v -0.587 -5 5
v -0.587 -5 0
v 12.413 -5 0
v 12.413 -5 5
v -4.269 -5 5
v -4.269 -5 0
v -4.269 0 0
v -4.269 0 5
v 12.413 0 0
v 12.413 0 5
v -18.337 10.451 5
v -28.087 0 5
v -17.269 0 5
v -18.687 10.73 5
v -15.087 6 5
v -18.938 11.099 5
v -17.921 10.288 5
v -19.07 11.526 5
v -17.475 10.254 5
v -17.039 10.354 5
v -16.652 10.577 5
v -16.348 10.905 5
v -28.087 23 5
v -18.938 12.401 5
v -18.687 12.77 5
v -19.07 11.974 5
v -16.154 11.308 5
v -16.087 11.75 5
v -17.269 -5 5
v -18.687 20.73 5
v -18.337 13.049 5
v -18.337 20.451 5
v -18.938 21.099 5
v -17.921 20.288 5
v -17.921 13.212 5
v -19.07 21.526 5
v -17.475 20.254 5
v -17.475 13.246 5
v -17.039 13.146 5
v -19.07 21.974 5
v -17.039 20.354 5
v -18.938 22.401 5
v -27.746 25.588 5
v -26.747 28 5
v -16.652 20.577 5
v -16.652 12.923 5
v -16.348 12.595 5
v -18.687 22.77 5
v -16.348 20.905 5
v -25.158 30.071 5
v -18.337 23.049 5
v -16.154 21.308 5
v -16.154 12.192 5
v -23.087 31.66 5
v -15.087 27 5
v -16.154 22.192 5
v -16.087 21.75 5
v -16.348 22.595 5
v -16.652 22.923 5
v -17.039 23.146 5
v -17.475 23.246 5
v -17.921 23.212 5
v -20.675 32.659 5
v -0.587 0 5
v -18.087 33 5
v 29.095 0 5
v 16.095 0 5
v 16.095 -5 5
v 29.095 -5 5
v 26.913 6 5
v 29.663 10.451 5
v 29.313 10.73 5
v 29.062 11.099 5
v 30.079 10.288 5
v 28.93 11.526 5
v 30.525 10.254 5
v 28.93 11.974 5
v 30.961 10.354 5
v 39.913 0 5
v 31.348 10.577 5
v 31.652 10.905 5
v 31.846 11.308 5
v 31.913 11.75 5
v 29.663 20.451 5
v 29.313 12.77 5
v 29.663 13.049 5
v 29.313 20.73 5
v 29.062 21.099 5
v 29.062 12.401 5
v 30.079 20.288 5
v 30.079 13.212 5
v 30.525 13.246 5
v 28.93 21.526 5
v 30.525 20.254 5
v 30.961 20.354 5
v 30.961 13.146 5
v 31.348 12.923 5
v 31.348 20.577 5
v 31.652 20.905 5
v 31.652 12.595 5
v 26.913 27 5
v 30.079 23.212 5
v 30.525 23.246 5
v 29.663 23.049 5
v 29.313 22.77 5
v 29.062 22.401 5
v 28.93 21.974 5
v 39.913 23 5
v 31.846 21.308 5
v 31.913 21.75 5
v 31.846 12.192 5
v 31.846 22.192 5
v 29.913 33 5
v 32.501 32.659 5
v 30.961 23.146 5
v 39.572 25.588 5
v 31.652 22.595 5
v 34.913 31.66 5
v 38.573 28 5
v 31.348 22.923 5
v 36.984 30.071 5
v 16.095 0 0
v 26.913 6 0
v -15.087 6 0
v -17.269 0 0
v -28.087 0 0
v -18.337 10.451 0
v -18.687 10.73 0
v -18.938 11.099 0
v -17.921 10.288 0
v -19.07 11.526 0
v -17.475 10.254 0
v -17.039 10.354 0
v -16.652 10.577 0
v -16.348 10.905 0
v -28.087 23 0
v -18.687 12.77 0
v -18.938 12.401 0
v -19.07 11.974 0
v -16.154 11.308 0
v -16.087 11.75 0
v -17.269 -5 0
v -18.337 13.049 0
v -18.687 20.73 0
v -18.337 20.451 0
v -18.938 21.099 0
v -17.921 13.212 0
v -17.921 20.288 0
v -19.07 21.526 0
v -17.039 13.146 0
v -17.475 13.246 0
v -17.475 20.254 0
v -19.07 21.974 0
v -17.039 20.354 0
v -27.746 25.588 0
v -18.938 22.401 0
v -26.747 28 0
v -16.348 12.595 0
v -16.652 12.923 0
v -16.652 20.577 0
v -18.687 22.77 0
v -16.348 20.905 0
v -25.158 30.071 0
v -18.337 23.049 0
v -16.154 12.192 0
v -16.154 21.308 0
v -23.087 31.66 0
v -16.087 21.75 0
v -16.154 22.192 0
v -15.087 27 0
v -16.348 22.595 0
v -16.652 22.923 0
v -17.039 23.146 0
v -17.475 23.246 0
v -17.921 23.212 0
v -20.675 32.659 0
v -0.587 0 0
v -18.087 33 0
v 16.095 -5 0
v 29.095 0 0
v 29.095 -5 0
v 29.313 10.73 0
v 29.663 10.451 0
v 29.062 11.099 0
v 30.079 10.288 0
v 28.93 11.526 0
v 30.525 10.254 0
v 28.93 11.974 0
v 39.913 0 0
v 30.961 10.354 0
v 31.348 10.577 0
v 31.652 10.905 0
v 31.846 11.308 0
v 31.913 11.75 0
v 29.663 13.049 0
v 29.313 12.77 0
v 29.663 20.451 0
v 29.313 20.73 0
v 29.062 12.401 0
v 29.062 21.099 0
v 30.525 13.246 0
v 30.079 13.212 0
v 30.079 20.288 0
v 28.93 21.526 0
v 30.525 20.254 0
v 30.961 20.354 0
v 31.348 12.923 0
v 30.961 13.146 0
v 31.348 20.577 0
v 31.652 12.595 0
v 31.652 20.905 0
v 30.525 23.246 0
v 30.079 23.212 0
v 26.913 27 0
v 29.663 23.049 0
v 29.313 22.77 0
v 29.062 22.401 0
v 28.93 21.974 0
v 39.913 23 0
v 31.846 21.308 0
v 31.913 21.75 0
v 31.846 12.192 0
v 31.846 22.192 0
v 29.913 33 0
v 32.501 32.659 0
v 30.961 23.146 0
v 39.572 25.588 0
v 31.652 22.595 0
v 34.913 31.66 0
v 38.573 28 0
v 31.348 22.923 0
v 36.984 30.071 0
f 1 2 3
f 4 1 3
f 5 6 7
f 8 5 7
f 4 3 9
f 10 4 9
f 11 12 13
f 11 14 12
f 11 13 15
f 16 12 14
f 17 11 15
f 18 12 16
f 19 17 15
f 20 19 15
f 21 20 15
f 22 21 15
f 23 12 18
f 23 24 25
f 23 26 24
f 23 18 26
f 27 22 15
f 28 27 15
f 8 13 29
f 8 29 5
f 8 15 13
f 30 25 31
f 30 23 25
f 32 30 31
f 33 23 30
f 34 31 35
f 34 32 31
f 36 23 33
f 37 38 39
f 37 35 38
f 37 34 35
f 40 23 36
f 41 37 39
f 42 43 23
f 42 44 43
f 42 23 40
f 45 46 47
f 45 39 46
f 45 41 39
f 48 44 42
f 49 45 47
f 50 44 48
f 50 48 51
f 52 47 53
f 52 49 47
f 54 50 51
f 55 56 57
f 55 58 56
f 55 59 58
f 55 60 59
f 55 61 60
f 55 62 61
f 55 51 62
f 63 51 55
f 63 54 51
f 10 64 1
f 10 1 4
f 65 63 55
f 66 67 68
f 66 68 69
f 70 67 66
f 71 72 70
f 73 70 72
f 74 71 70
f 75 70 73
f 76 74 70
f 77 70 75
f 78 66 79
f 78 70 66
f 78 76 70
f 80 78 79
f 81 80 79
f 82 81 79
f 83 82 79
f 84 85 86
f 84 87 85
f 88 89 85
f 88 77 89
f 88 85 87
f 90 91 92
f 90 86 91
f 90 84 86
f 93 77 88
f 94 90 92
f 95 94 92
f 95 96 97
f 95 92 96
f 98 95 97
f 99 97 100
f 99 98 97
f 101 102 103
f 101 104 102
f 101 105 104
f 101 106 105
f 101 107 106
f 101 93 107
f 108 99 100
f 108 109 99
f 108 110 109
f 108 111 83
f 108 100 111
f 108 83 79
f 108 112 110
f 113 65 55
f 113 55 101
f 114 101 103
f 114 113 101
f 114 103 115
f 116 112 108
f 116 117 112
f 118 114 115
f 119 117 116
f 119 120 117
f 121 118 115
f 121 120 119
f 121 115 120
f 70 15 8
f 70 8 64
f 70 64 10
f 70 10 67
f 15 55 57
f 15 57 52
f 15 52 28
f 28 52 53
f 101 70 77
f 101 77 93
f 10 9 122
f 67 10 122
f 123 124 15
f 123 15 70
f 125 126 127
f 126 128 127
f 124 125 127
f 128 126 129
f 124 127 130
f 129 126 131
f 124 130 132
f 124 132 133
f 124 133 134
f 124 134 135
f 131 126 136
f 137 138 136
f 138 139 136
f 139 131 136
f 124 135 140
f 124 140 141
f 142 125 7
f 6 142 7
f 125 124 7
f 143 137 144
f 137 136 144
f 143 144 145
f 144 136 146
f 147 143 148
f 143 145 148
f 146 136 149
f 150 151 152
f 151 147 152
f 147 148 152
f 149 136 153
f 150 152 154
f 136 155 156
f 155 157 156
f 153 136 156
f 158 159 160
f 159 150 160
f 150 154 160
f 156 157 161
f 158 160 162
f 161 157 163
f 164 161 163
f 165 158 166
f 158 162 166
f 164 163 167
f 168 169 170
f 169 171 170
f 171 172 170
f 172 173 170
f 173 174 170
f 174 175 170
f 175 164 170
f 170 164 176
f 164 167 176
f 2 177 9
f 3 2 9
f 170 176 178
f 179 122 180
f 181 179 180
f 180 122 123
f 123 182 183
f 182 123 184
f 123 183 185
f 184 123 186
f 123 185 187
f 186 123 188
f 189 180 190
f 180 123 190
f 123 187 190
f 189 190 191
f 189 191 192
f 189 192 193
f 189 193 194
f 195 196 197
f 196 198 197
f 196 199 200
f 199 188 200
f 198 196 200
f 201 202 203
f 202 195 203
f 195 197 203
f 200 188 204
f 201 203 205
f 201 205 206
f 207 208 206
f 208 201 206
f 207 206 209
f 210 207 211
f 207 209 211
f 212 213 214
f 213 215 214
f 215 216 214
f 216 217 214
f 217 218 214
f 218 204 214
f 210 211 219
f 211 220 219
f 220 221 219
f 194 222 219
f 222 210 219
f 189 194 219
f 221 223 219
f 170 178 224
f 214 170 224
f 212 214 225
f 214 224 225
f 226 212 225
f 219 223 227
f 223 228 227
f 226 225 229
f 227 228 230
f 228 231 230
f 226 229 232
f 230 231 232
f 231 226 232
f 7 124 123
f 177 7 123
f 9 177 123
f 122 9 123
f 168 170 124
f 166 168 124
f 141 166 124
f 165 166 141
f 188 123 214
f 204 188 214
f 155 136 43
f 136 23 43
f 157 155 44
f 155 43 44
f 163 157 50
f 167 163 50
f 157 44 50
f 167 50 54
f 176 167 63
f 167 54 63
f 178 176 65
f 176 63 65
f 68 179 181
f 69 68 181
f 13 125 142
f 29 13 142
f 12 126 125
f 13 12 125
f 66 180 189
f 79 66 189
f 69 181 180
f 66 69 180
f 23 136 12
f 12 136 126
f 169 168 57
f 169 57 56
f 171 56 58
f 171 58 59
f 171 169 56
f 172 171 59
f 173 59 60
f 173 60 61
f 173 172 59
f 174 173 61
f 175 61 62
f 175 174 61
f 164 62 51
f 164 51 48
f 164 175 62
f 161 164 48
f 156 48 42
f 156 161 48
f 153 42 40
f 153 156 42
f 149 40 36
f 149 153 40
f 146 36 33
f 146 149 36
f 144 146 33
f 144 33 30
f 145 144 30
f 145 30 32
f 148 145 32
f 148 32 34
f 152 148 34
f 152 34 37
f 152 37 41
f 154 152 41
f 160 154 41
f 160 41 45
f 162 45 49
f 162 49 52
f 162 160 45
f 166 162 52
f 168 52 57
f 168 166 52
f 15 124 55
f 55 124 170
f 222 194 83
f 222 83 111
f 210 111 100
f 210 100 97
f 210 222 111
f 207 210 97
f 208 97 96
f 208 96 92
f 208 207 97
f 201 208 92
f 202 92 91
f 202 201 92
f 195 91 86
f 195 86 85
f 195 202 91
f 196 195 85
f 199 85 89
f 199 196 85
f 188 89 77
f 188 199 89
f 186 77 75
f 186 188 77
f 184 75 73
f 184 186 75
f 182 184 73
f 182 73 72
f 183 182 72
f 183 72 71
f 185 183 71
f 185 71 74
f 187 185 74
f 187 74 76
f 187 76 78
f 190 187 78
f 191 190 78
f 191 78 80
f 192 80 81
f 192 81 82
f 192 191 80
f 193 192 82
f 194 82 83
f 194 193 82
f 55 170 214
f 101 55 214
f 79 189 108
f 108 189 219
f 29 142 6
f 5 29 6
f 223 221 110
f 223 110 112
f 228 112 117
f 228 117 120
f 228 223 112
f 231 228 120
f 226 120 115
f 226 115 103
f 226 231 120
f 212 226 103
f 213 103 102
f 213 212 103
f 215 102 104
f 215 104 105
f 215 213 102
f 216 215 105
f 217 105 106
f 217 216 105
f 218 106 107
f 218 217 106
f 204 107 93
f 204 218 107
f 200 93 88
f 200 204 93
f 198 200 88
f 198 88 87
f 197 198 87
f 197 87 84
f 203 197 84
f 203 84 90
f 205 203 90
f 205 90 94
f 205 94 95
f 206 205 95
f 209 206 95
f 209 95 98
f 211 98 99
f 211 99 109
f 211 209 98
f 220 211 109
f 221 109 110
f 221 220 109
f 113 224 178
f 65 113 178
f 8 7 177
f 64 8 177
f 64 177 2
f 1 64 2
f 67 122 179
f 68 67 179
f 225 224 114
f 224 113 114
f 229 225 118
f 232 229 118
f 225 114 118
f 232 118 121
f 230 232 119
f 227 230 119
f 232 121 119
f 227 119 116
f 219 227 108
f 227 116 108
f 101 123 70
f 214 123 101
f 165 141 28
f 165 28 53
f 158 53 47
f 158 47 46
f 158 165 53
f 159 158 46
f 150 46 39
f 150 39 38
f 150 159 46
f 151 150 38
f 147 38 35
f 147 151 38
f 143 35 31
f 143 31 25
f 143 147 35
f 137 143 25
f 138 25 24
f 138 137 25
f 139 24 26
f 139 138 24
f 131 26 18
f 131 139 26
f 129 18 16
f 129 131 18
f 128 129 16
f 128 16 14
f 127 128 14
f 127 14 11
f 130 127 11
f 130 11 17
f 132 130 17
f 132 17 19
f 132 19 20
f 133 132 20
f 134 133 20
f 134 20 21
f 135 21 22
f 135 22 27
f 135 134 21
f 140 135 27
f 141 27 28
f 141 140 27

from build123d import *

# Parameters (mm, degrees)
SKETCH1_R           = 1.5
SKETCH1_W           = 42
SKETCH1_H           = 21
BOSS_EXTRUDE1_DEPTH = 5
FILLET2_R           = 10
FILLET3_R           = 10


with BuildPart() as part:
    # Sketch1 → Boss-Extrude1 (new body)
    with BuildSketch(Plane.XY):
        Polygon((-28.086956522, 0), (-17.269090954, 0), (-17.269090954, -5), (-4.269090954, -5), (-4.269090954, 0), (-0.586956522, 0), (-0.586956522, -5), (12.413043478, -5), (12.413043478, 0), (16.095177911, 0), (16.095177911, -5), (29.095177911, -5), (29.095177911, 0), (39.913043478, 0), (39.913043478, 33), (-28.086956522, 33), align=None)
        with Locations((30.413043478, 21.75)):
            Circle(SKETCH1_R, mode=Mode.SUBTRACT)
        with Locations((30.413043478, 11.75)):
            Circle(SKETCH1_R, mode=Mode.SUBTRACT)
        with Locations((-17.586956522, 21.75)):
            Circle(SKETCH1_R, mode=Mode.SUBTRACT)
        with Locations((-17.586956522, 11.75)):
            Circle(SKETCH1_R, mode=Mode.SUBTRACT)
        with Locations((5.913043478, 16.5)):
            Rectangle(SKETCH1_W, SKETCH1_H, mode=Mode.SUBTRACT)
    extrude(amount=BOSS_EXTRUDE1_DEPTH)

    # Fillet2
    fillet2_edges = [part.edges().sort_by_distance(p)[0] for p in [
        (-28.086956522, 33, 2.5),
    ]]
    fillet(fillet2_edges, radius=FILLET2_R)

    # Fillet3
    fillet3_edges = [part.edges().sort_by_distance(p)[0] for p in [
        (39.913043478, 33, 2.5),
    ]]
    fillet(fillet3_edges, radius=FILLET3_R)


solid = part.part
